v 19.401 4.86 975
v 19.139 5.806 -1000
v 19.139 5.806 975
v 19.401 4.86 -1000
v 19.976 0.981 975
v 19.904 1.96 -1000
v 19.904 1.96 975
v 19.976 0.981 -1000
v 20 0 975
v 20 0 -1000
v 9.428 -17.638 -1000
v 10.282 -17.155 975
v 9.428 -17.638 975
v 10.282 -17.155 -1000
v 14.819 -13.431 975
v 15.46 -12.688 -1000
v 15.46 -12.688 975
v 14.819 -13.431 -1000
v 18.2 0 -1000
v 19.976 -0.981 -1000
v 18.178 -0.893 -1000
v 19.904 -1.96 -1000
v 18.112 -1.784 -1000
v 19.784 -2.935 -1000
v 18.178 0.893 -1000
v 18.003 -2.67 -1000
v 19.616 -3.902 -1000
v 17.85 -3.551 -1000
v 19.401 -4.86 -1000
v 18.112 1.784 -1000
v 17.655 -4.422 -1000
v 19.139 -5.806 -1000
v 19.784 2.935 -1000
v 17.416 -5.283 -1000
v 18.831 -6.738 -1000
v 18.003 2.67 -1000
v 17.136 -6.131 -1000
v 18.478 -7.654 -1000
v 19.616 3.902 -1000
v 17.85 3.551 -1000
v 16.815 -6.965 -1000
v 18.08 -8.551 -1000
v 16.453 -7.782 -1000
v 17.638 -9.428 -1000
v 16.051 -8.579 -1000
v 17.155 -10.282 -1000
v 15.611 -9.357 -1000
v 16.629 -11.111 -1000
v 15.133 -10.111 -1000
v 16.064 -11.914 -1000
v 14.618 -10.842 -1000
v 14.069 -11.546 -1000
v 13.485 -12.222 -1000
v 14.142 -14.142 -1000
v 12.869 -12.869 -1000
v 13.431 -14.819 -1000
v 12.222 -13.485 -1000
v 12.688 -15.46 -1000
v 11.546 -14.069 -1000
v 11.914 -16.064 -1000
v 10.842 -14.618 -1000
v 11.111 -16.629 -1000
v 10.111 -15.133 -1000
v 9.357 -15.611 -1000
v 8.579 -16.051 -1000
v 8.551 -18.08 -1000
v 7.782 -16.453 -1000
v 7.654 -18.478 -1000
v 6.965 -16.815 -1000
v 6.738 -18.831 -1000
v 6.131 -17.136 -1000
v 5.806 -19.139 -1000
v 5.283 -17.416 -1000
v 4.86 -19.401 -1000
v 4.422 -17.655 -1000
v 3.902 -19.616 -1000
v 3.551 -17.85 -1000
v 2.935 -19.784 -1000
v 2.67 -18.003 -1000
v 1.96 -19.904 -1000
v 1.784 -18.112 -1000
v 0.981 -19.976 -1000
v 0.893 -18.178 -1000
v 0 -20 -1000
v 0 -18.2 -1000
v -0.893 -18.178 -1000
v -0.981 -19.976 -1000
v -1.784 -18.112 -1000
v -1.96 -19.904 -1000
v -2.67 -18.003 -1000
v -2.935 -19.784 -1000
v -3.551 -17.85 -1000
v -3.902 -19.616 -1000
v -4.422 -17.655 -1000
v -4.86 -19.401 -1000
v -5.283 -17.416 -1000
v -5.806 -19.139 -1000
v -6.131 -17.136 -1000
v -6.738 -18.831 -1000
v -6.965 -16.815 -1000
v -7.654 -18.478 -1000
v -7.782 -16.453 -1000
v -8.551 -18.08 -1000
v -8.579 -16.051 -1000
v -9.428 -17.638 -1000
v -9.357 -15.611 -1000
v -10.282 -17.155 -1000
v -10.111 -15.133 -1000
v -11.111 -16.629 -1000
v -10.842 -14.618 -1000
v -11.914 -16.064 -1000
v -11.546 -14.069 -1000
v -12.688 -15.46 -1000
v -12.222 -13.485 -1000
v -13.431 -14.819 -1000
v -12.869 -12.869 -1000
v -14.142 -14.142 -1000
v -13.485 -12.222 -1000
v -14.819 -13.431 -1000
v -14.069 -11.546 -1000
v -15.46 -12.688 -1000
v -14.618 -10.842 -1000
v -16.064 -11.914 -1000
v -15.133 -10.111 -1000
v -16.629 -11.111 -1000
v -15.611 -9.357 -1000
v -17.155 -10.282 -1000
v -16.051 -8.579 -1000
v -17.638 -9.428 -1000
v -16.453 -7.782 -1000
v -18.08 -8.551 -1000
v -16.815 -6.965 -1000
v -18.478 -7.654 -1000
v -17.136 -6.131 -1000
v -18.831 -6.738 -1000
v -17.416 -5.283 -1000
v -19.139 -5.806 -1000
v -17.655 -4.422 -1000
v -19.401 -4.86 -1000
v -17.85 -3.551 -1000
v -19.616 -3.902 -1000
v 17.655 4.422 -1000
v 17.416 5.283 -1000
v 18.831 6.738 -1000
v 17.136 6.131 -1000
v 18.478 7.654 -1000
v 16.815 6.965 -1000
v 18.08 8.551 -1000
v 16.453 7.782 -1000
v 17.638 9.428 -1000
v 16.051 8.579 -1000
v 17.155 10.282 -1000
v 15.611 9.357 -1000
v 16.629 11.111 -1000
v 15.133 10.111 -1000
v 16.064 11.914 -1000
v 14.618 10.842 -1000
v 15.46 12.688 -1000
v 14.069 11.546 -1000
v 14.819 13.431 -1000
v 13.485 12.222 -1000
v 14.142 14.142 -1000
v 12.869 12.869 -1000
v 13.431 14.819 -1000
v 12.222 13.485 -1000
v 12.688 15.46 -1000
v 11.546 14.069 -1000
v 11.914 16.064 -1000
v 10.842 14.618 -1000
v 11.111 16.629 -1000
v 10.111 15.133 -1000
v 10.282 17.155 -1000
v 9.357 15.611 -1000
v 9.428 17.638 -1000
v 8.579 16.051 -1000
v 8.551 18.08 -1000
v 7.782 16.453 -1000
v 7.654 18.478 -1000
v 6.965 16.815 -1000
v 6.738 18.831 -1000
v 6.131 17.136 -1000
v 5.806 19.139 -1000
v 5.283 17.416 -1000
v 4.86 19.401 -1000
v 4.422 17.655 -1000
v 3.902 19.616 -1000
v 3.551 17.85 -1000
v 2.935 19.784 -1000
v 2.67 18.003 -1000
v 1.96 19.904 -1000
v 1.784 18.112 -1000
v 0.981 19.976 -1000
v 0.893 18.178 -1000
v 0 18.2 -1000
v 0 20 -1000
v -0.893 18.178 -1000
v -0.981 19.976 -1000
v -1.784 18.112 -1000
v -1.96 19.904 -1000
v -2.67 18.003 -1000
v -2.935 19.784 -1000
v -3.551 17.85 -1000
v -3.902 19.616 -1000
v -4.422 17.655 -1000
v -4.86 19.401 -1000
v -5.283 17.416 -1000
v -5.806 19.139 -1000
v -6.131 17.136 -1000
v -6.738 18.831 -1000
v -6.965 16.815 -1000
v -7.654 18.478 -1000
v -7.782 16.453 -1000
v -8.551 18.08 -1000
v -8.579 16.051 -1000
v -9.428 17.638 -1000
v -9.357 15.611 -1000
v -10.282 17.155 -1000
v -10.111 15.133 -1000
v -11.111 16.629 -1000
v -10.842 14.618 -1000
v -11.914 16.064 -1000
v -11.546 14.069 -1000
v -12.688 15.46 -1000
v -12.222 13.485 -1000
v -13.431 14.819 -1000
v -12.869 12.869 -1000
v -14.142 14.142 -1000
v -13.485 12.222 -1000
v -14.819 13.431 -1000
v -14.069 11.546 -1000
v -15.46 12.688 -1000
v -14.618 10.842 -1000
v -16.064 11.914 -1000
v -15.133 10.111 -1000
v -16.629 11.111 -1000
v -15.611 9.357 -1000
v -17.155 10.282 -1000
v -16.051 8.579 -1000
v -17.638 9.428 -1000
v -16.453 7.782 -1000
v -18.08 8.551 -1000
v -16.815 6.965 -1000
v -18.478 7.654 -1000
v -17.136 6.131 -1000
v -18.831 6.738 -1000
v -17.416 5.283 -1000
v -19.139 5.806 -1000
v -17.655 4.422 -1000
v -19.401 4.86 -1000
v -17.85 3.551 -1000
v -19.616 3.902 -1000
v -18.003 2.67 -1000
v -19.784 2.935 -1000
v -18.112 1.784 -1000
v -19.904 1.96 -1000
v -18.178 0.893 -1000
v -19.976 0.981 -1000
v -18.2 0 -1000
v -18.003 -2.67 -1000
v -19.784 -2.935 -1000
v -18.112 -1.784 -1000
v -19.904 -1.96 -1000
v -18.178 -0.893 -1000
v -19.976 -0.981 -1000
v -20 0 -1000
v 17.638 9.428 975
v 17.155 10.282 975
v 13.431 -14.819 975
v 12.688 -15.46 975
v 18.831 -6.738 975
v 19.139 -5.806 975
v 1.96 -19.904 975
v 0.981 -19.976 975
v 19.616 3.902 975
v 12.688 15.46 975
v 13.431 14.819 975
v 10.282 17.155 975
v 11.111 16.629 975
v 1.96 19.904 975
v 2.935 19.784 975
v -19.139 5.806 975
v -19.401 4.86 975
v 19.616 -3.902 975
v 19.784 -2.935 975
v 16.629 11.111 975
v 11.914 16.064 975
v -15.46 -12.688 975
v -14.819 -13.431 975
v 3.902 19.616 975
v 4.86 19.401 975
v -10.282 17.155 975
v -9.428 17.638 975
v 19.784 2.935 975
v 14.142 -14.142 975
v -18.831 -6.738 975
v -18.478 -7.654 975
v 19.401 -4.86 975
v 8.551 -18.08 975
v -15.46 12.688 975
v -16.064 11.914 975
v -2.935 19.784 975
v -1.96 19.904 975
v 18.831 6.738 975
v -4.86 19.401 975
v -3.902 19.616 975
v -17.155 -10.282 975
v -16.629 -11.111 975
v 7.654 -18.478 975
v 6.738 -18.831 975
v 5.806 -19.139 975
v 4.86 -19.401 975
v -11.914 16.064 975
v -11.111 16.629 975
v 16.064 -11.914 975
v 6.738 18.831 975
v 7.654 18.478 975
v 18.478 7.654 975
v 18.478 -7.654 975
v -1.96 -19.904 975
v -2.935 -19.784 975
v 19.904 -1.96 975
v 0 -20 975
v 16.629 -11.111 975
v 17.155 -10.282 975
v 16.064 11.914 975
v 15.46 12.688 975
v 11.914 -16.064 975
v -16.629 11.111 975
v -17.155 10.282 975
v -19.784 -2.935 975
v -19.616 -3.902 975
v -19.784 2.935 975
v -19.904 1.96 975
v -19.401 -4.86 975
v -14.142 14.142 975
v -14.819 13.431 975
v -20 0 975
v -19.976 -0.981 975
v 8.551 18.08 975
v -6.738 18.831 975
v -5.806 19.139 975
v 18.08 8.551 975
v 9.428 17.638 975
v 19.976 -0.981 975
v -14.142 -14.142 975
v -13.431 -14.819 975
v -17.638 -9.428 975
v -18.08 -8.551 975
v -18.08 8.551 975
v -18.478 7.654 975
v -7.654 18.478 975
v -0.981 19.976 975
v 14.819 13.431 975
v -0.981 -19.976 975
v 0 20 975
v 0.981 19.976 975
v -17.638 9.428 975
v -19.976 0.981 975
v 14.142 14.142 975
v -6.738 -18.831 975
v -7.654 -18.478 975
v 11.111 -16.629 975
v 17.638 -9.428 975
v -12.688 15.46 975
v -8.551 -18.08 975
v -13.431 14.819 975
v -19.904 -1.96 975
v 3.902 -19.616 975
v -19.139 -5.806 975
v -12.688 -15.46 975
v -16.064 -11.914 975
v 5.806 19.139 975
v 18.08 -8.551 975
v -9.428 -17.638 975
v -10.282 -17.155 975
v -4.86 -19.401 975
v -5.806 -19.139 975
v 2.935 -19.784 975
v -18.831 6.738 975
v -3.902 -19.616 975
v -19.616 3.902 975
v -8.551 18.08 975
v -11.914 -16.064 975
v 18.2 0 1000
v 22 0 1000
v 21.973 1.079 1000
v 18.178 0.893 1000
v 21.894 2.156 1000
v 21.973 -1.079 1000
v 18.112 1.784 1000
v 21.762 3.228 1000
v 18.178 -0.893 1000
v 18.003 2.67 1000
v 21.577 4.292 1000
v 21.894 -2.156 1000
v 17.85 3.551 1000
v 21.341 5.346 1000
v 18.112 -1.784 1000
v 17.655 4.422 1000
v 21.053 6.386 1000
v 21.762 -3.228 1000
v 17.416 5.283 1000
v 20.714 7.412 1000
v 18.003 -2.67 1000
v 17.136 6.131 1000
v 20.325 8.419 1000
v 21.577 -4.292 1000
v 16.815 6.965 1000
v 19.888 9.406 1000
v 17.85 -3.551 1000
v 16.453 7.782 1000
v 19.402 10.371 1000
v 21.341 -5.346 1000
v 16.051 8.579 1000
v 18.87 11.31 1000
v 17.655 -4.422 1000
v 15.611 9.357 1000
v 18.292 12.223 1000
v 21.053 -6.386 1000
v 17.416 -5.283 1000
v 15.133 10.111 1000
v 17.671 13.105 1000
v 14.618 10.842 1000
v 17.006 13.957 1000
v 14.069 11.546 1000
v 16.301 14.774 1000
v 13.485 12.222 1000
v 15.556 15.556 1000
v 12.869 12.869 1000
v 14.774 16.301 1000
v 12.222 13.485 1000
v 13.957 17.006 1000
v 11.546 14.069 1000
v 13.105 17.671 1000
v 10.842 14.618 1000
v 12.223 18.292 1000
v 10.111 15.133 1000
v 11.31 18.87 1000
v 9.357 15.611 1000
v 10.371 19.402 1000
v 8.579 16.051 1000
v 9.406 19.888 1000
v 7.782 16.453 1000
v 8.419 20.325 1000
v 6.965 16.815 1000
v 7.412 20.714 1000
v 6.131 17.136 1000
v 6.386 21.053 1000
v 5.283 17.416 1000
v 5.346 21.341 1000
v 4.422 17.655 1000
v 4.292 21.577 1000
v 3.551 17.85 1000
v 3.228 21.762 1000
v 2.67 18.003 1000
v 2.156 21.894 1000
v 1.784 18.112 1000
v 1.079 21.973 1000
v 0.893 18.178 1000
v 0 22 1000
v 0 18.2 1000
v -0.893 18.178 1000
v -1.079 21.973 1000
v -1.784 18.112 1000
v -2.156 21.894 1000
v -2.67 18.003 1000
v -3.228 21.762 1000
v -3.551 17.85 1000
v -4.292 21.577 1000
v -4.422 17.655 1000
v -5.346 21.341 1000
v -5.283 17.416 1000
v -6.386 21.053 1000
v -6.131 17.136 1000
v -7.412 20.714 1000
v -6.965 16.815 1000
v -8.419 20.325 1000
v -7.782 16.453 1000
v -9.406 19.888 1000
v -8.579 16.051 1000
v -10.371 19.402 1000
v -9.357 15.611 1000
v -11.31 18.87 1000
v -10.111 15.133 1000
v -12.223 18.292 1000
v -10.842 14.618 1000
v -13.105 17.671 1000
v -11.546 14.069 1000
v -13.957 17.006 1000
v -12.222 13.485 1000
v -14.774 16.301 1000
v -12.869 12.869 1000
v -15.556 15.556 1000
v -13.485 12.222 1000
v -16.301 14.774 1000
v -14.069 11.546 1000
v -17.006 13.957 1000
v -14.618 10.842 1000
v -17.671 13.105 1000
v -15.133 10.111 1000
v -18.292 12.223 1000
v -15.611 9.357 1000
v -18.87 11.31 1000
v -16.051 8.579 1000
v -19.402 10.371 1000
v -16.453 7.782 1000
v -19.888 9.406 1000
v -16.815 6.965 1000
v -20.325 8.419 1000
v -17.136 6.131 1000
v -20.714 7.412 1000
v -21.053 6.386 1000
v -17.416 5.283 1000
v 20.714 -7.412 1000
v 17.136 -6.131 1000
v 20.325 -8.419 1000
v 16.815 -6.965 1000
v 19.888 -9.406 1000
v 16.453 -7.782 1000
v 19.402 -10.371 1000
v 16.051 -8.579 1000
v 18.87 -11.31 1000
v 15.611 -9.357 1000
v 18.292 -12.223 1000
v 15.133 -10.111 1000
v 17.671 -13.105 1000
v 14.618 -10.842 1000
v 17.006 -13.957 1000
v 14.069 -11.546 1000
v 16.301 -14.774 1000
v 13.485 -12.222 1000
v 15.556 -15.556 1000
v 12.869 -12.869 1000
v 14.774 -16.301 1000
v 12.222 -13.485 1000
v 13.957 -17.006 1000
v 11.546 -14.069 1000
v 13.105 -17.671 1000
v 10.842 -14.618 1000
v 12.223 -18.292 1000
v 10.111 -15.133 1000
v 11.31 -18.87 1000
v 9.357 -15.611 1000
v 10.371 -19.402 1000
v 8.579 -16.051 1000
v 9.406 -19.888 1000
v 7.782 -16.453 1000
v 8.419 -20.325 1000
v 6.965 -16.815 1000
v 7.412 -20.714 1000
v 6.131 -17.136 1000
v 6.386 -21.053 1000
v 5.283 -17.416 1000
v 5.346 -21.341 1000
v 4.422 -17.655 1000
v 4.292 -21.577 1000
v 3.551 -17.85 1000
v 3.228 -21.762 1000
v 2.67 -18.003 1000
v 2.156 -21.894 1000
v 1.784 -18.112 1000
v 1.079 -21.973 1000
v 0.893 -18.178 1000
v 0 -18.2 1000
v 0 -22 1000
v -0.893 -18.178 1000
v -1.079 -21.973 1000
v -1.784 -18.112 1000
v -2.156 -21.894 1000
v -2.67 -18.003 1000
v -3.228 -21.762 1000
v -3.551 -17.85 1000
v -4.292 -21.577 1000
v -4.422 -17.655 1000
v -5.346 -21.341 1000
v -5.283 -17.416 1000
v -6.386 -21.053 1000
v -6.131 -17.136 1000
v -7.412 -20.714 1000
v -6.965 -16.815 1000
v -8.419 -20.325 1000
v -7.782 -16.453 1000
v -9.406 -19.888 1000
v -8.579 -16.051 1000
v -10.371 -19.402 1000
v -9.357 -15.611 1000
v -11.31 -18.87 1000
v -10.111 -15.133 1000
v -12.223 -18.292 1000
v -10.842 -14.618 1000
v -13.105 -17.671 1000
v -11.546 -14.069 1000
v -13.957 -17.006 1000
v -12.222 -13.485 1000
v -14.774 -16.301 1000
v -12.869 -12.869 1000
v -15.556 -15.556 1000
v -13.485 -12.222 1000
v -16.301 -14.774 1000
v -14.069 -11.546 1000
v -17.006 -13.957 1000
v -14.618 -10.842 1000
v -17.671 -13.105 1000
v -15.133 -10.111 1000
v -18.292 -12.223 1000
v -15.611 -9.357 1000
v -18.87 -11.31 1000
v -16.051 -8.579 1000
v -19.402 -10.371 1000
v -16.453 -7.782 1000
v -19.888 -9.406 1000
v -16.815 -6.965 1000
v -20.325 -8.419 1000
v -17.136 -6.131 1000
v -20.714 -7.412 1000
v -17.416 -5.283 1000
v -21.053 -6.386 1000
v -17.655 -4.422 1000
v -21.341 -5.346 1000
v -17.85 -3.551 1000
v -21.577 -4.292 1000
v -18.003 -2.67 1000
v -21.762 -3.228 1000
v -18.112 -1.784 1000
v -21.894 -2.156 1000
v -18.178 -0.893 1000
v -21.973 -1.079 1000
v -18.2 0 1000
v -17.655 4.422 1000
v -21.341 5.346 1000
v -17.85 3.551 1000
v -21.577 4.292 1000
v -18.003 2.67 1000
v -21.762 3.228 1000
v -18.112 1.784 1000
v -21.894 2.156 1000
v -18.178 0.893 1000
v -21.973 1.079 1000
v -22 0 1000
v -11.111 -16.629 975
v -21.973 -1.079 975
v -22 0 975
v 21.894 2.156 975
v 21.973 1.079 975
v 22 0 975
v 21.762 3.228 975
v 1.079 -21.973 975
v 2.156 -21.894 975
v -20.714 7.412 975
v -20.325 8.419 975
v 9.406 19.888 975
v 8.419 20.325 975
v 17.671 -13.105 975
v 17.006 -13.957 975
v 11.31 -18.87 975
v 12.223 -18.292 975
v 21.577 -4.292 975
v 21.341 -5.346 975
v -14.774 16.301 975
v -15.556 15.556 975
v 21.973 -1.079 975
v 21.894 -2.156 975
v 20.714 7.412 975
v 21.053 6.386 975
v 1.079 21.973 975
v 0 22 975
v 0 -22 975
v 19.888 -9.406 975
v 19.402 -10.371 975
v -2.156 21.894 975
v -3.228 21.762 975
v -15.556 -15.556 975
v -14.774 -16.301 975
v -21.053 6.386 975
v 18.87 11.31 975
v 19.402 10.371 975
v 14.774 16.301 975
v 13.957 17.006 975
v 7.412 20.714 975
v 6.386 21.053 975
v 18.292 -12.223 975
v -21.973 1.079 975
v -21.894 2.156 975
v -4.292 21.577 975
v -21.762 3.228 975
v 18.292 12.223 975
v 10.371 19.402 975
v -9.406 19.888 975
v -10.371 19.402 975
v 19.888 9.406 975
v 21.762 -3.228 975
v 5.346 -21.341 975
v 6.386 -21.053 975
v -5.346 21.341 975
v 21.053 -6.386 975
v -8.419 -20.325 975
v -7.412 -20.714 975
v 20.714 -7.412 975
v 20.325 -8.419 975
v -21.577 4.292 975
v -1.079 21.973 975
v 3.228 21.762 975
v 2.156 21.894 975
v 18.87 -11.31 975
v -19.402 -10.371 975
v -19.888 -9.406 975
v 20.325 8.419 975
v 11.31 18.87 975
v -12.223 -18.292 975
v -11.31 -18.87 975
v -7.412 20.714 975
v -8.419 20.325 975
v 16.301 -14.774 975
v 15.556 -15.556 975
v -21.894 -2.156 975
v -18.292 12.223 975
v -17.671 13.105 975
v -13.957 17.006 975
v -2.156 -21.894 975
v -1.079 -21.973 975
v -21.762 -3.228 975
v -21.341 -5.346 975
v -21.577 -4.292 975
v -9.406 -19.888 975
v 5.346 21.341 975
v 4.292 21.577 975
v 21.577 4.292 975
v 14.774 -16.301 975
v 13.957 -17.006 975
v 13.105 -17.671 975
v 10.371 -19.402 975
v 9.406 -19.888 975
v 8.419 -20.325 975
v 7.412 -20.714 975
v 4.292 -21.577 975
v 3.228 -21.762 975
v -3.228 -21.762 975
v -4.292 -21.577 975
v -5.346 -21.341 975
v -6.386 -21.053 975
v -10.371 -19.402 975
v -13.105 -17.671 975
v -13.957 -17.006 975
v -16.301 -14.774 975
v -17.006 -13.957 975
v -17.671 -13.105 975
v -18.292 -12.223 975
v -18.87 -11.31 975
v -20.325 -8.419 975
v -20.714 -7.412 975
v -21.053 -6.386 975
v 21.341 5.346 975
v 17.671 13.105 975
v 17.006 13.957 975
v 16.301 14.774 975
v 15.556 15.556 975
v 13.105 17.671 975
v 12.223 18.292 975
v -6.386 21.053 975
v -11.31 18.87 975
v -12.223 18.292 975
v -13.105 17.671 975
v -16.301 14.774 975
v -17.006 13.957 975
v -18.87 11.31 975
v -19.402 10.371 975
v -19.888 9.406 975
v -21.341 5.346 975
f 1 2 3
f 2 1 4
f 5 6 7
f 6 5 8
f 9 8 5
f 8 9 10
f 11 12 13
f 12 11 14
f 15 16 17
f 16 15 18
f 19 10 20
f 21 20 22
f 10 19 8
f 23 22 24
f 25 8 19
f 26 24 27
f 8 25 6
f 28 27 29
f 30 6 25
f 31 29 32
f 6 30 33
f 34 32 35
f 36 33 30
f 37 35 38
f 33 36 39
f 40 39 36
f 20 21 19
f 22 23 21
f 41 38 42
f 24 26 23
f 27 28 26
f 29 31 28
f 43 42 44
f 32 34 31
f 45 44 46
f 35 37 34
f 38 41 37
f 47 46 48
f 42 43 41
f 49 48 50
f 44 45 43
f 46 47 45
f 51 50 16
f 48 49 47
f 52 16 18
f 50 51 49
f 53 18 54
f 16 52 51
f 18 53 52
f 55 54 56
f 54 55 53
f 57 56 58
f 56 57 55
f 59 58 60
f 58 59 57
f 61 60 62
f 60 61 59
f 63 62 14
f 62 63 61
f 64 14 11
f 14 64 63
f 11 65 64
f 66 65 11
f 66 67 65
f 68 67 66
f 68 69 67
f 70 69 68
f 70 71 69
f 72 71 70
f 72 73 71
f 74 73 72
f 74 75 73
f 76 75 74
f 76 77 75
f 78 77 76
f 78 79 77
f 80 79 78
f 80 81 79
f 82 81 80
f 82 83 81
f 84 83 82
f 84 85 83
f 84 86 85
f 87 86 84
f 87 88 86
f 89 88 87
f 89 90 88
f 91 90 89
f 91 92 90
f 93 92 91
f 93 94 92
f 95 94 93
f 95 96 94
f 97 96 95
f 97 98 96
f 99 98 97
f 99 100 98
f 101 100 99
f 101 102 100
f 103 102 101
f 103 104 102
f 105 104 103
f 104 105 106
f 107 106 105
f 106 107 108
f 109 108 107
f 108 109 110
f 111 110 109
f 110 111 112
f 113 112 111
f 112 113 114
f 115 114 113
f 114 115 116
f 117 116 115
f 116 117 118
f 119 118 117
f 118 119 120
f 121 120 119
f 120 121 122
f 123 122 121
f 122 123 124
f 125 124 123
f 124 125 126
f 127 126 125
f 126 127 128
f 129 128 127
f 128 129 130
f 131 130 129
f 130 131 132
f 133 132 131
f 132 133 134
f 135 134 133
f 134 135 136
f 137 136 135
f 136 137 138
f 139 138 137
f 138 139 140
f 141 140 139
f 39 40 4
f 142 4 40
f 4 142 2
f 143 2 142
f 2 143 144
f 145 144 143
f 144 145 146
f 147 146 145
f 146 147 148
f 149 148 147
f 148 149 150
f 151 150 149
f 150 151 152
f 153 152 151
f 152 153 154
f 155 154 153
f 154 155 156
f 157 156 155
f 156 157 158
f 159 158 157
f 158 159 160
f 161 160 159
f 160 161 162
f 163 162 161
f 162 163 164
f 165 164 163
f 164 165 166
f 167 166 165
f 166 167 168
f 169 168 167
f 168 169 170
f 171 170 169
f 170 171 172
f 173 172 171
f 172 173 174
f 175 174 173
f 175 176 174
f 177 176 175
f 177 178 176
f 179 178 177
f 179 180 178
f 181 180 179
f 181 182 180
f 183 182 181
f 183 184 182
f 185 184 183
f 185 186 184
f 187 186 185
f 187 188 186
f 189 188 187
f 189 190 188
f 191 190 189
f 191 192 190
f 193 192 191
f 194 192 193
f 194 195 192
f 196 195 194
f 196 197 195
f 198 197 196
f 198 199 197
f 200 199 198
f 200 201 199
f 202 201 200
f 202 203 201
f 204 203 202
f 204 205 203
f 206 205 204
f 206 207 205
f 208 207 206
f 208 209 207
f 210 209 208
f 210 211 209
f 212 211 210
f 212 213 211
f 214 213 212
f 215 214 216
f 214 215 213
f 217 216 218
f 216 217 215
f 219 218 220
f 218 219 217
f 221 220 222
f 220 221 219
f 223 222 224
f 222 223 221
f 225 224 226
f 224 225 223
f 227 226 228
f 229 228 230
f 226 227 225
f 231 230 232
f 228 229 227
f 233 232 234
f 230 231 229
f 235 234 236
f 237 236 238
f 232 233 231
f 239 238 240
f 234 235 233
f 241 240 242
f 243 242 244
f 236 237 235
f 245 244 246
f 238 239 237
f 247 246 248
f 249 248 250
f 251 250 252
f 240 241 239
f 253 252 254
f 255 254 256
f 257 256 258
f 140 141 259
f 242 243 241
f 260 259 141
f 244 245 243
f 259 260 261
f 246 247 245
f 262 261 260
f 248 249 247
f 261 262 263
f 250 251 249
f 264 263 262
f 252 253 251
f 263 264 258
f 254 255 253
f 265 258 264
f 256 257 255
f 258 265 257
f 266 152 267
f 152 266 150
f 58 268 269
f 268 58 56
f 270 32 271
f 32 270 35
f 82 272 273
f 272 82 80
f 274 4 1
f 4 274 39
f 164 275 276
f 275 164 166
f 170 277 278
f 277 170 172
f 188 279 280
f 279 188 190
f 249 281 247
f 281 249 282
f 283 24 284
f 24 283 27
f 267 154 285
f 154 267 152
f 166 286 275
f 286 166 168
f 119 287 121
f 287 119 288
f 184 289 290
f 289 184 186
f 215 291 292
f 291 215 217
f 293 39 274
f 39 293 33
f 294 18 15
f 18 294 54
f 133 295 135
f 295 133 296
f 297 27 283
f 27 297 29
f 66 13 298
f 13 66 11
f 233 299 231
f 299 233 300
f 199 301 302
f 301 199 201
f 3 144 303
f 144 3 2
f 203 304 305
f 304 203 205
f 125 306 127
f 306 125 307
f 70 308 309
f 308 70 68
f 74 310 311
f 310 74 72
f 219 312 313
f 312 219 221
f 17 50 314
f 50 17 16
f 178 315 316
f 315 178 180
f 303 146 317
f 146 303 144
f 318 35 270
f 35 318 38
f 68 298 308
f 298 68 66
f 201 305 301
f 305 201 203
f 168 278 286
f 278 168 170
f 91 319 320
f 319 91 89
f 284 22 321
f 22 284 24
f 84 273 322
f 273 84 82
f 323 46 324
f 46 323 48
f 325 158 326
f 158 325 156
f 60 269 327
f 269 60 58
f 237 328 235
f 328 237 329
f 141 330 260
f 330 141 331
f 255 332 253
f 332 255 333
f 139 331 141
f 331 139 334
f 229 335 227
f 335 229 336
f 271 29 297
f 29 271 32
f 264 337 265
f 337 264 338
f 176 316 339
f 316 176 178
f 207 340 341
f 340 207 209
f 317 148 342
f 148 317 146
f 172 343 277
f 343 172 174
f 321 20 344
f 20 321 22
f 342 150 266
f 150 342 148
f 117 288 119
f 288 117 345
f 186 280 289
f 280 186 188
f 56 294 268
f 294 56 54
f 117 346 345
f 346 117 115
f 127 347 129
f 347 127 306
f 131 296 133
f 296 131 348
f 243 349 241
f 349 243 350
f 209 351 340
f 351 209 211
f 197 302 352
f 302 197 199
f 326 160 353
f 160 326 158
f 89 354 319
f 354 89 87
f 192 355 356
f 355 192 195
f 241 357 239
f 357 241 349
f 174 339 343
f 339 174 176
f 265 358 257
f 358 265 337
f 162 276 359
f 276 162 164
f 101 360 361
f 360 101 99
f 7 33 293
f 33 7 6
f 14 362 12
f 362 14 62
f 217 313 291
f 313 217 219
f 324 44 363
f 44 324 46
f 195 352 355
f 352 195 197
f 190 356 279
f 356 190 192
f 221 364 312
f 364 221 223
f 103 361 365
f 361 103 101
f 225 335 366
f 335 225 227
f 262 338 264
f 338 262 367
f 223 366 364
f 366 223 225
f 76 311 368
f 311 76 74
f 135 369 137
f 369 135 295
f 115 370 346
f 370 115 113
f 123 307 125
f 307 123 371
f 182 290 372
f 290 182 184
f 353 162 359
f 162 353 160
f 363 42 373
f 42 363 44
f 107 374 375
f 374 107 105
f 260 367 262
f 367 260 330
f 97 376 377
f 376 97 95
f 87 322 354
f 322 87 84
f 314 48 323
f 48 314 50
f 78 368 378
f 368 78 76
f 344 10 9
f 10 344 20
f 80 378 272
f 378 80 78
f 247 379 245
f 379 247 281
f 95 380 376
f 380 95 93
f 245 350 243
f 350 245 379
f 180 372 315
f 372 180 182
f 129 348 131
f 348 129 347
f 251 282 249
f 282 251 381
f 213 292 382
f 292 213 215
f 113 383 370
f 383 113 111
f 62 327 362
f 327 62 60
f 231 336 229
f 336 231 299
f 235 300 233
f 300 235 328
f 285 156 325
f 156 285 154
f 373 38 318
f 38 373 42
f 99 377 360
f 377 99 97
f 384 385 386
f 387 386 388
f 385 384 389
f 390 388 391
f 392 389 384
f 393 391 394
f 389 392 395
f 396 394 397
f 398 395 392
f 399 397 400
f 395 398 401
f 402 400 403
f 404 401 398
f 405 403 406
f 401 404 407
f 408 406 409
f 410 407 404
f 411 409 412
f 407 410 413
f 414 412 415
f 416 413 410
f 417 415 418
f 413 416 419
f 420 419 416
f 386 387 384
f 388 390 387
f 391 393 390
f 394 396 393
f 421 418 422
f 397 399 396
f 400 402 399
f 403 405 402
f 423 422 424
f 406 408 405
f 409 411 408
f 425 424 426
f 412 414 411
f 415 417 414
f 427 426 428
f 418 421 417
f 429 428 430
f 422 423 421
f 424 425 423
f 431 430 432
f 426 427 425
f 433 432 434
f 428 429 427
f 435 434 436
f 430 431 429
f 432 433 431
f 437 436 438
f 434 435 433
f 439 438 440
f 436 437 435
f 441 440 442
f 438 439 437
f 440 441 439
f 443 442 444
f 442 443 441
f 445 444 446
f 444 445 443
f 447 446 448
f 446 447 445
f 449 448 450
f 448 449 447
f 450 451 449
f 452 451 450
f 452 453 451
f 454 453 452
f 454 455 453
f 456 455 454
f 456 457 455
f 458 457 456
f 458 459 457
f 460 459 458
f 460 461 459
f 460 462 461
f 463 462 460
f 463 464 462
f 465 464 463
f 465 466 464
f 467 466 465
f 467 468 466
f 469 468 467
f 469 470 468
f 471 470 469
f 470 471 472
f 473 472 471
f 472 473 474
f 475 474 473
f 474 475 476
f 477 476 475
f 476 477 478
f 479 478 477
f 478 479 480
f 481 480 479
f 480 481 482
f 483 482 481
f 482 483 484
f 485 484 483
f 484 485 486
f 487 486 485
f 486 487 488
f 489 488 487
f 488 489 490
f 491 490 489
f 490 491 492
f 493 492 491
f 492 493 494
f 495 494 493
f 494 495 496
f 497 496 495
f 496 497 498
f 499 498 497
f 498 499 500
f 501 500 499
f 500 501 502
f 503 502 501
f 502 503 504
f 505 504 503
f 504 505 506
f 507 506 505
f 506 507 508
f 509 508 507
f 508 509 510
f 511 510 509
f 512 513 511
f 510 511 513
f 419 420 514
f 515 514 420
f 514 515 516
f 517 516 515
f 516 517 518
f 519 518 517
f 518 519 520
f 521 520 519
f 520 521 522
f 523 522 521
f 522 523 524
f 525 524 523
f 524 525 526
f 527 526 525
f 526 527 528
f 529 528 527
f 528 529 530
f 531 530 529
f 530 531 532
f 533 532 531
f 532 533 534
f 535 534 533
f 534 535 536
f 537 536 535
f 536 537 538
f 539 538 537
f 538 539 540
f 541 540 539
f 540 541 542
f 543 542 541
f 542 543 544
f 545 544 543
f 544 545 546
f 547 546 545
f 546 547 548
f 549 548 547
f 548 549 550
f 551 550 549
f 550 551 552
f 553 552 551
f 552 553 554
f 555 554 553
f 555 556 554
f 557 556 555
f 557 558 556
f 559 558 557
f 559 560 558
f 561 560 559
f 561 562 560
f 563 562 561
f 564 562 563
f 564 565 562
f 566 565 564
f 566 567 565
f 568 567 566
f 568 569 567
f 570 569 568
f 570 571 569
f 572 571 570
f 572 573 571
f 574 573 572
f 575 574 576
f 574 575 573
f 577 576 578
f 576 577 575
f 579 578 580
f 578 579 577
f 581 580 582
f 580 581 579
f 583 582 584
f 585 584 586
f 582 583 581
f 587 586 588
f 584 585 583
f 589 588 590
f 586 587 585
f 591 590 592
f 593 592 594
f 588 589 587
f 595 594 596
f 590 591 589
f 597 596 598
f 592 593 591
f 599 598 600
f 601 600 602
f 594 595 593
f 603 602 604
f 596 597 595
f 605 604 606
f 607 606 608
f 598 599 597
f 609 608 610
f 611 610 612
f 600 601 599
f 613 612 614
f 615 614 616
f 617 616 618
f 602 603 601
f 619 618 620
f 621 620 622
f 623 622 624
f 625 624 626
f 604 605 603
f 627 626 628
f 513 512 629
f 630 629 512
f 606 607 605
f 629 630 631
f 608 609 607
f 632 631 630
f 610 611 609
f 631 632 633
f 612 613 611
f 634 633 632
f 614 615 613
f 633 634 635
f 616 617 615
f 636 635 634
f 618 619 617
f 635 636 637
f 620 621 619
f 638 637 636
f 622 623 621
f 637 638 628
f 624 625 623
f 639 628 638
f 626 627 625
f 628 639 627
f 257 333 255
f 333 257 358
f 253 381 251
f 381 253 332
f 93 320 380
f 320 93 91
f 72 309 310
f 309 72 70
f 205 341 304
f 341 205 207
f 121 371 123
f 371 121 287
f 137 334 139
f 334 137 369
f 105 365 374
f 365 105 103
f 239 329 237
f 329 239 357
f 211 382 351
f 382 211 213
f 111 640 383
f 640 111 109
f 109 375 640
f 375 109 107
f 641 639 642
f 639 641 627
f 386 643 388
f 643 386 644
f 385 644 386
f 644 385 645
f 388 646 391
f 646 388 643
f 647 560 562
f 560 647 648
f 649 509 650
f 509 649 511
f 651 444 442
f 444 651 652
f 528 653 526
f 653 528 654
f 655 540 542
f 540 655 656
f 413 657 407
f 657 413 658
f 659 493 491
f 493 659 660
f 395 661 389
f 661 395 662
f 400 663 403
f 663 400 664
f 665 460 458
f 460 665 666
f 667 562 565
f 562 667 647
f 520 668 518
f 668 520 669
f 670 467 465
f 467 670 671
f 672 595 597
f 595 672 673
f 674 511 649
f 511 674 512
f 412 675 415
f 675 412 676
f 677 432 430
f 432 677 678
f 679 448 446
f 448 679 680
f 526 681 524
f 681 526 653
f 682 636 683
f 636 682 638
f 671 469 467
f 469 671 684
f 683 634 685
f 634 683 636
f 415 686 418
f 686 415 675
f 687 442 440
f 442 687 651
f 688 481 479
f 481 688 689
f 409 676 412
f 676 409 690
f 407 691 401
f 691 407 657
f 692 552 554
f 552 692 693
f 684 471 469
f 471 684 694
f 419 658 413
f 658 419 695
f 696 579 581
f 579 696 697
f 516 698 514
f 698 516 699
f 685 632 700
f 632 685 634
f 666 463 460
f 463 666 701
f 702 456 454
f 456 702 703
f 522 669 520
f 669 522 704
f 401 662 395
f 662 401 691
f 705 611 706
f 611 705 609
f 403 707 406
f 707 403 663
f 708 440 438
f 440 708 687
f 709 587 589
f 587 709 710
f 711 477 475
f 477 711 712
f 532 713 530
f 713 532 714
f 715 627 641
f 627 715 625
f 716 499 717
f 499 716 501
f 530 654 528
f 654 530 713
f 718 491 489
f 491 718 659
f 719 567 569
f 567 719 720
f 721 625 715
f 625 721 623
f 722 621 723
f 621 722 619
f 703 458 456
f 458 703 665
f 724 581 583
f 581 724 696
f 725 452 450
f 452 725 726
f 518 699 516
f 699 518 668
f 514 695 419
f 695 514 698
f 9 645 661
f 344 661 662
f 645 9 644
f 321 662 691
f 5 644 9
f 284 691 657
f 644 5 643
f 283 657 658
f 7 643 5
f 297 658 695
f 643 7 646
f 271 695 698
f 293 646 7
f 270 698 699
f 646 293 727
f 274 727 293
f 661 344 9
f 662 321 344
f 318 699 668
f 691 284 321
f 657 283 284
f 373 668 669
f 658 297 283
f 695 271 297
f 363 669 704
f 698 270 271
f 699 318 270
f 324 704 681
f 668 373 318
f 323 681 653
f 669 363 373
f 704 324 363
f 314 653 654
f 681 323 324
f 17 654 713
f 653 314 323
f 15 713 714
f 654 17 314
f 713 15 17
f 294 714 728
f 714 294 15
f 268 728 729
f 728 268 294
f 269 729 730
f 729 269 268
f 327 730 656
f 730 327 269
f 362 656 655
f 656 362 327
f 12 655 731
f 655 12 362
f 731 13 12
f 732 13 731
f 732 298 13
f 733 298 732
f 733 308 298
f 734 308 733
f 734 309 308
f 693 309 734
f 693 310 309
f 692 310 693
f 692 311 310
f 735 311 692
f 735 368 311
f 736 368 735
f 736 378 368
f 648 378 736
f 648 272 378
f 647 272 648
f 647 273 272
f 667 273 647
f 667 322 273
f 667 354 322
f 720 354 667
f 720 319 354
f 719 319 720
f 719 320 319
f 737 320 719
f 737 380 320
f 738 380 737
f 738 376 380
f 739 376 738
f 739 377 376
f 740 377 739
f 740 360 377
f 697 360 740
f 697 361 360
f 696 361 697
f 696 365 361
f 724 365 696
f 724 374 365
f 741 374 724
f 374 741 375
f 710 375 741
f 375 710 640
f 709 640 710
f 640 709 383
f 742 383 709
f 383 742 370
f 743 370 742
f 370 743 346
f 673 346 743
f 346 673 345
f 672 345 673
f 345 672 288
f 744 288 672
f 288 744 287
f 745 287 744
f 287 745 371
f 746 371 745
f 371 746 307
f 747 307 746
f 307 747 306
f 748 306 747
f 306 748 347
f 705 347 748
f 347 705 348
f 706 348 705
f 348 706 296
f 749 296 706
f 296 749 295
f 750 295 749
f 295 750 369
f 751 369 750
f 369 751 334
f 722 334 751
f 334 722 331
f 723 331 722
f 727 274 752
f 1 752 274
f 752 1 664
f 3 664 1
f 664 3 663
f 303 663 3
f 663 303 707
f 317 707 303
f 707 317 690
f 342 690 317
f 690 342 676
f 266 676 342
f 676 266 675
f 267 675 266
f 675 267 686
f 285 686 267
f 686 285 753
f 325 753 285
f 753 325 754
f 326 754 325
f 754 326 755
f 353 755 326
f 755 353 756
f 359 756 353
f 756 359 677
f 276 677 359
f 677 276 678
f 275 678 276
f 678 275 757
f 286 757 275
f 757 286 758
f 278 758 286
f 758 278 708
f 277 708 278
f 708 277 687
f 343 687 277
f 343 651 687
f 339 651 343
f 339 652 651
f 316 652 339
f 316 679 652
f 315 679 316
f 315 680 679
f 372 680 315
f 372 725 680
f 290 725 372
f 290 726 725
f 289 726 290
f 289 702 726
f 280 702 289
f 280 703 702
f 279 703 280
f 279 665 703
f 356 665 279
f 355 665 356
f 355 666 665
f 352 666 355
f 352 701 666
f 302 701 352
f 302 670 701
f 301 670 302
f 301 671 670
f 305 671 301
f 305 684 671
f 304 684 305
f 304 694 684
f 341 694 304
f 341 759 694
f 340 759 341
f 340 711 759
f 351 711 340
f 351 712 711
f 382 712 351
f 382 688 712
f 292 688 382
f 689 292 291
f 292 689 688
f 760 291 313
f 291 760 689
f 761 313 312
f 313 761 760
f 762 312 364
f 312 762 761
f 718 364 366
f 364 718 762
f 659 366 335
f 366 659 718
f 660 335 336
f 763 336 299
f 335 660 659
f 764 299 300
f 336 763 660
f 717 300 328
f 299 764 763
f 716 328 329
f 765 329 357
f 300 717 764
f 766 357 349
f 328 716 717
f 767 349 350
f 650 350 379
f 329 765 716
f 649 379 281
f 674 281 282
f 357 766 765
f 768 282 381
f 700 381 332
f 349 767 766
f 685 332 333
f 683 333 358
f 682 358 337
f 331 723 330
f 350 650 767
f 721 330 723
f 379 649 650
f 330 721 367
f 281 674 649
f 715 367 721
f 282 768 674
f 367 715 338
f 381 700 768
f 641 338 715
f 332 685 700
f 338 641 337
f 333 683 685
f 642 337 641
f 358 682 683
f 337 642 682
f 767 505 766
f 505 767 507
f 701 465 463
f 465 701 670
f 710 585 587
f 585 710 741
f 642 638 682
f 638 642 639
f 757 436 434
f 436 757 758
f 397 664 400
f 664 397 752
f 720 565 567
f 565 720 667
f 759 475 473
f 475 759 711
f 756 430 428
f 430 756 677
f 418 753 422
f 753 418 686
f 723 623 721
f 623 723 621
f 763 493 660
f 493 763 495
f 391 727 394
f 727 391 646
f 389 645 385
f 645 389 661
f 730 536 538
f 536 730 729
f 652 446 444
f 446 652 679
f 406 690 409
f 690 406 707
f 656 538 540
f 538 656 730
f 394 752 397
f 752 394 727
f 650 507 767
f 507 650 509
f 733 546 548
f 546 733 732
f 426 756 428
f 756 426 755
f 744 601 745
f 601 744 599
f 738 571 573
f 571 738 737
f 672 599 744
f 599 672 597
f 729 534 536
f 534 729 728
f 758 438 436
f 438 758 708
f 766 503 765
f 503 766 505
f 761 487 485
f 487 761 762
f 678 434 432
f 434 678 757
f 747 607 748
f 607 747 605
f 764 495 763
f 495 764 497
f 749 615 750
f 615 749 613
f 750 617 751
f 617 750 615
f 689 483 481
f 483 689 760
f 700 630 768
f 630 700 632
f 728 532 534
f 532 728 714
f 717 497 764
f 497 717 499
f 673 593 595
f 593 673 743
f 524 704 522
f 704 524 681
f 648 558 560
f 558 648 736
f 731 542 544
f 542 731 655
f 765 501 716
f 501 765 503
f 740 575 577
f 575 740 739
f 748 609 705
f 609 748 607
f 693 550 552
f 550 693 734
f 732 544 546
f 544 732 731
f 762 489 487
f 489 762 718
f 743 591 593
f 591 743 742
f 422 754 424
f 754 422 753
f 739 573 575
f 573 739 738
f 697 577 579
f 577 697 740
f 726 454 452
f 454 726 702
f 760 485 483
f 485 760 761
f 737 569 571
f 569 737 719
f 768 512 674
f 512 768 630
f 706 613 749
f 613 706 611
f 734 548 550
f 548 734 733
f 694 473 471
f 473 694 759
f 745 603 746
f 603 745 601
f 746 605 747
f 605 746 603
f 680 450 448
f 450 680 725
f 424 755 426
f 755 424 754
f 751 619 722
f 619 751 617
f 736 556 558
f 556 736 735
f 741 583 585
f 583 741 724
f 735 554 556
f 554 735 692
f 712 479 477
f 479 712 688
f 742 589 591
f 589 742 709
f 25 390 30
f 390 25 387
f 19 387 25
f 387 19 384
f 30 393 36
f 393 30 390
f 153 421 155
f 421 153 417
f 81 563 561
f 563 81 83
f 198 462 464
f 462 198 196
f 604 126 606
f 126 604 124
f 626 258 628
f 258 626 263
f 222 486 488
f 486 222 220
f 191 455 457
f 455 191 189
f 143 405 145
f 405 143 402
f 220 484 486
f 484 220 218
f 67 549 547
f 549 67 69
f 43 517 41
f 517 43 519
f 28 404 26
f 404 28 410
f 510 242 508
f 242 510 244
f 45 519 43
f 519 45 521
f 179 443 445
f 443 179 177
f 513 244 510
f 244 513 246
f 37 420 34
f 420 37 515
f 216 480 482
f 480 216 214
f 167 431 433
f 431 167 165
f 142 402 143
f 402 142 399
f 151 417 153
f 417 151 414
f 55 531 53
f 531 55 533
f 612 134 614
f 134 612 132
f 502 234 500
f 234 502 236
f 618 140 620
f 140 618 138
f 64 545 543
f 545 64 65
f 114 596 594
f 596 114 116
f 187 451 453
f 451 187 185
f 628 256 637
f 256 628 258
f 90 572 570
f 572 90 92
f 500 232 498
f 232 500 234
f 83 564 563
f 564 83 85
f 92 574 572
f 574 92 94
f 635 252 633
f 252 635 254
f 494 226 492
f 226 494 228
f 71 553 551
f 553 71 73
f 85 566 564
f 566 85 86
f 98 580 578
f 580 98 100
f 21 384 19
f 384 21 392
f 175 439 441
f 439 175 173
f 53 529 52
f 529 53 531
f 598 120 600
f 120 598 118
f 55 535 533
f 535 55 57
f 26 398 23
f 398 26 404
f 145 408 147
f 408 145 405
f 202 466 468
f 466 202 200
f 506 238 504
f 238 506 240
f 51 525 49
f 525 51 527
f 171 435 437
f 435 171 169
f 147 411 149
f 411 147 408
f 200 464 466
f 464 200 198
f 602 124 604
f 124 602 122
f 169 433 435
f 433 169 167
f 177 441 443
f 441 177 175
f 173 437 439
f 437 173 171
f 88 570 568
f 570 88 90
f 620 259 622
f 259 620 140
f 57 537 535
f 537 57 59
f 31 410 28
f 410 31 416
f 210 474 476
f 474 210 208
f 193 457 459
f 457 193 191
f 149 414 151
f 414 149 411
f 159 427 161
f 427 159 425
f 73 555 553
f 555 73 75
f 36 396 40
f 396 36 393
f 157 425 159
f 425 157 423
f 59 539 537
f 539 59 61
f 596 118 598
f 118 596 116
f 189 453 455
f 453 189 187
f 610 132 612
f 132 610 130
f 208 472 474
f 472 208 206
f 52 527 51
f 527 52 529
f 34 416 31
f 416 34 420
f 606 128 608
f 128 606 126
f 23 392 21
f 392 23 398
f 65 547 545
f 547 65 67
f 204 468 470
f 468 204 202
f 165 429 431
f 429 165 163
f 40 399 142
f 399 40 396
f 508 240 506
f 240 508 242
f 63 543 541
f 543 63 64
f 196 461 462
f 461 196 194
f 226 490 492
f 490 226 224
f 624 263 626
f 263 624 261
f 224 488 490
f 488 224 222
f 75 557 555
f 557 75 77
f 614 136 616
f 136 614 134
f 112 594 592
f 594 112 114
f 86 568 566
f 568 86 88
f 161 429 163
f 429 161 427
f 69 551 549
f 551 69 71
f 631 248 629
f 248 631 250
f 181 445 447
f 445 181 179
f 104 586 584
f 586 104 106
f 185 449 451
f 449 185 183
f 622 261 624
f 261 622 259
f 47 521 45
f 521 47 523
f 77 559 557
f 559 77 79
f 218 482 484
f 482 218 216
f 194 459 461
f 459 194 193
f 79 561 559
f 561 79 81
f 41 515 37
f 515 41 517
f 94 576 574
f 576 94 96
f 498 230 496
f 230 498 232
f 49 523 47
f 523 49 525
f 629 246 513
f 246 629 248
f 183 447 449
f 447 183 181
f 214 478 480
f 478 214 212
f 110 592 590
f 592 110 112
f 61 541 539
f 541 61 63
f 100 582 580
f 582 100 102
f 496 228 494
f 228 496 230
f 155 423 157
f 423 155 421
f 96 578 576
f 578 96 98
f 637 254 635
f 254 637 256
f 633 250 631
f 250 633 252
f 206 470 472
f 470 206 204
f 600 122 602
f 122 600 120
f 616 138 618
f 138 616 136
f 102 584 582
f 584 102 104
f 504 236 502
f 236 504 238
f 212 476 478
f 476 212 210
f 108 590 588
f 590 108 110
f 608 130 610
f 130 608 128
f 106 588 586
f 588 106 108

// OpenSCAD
// Parameters
pipe_standard = 1; //[1:1:1]
nominal_size = 40; //[20:80:1]
length_mm = 2000; //[1000:4000:10]
ht40_outer_diameter = 40; //[30:60:0.5]
ht40_wall_thickness = 1.8; //[1:4:0.1]
end_interface_length = 25; //[10:60:1]
end_interface_radial_add = 2; //[0.5:6:0.5]
connect_overlap = 1; //[0.5:2:0.1]

$fn = 128;

// HT Pipe - one connected solid, centered for reliable orthographic views
module ht_pipe() {
    od      = ht40_outer_diameter;
    wt      = ht40_wall_thickness;
    L       = length_mm;
    sockL   = end_interface_length;
    sockAdd = end_interface_radial_add;
    ov      = connect_overlap;

    // Safety clamps
    wt_eff = min(wt, od/2 - 0.2);
    id     = od - 2*wt_eff;
    ir     = id/2;

    // Center the whole part on Z so front/back/left/right views show geometry
    translate([0, 0, -L/2])
    color([0.85, 0.85, 0.8])
    difference() {
        // OUTER: main pipe + socket (single connected solid)
        union() {
            // Main outer cylinder
            cylinder(h=L, r=od/2, center=false);

            // Socket outer cylinder at the +Z end, connected by construction
            translate([0, 0, L - sockL])
                cylinder(h=sockL, r=od/2 + sockAdd, center=false);
        }

        // INNER VOID: continuous bore through entire length (including socket)
        translate([0, 0, -ov])
            cylinder(h=L + 2*ov, r=ir, center=false);
    }
}

ht_pipe();
